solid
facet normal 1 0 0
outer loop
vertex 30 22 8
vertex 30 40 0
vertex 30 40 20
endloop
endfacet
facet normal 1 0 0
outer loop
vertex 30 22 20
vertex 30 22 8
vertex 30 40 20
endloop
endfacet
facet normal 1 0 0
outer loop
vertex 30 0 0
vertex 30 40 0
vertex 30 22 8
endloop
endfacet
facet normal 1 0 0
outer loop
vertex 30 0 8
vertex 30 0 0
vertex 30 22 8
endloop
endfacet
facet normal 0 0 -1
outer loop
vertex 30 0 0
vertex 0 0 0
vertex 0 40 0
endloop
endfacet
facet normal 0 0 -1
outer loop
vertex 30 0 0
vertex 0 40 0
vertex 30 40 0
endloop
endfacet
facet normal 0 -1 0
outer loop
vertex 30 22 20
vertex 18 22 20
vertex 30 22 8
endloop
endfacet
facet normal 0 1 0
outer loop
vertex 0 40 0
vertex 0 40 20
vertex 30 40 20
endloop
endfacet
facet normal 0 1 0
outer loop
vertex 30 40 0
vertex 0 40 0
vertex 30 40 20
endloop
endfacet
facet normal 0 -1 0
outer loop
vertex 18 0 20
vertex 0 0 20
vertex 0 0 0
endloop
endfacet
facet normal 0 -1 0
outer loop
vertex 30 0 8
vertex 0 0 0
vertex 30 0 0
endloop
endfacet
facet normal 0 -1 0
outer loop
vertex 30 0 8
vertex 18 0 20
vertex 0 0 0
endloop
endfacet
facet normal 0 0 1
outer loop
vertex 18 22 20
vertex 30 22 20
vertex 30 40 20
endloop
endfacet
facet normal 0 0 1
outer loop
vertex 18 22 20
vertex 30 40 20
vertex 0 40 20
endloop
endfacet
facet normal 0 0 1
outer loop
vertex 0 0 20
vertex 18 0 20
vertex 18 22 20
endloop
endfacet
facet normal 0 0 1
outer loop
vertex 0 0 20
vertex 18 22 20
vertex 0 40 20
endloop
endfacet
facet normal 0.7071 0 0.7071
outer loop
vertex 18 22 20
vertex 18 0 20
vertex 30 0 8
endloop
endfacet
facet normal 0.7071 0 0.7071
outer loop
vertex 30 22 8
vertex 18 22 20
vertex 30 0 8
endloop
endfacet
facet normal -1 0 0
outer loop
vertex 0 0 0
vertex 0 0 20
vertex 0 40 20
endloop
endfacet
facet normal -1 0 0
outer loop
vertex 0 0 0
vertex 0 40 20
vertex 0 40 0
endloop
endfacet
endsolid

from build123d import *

# Parameters (mm, degrees)
F1_DEPTH  = 40
F1_FACE_W = 30
F1_FACE_H = 20
F3_DEPTH  = 22


with BuildPart() as f1:
    # F0 (on Front) → F1 (new body)
    with BuildSketch(Plane.XZ):
        Polygon((0, 20), (0, 0), (30, 0), (30, 8), (18, 20), align=None)
        Polygon((18, 20), (30, 8), (30, 20), align=None)
    extrude(amount=-F1_DEPTH)

    # F2 (on Front) + F1_face (on face) → F3 (cut)
    with BuildSketch(Plane.XZ):
        Polygon((30, 20), (18, 20), (30, 8), align=None)
    with BuildSketch(Plane(origin=(15, 40, 10), x_dir=(1, 0, 0), z_dir=(0, 1, 0))):
        Rectangle(F1_FACE_W, F1_FACE_H)
    extrude(amount=-F3_DEPTH, dir=(0, -1, 0), mode=Mode.SUBTRACT)


solid = f1.part
